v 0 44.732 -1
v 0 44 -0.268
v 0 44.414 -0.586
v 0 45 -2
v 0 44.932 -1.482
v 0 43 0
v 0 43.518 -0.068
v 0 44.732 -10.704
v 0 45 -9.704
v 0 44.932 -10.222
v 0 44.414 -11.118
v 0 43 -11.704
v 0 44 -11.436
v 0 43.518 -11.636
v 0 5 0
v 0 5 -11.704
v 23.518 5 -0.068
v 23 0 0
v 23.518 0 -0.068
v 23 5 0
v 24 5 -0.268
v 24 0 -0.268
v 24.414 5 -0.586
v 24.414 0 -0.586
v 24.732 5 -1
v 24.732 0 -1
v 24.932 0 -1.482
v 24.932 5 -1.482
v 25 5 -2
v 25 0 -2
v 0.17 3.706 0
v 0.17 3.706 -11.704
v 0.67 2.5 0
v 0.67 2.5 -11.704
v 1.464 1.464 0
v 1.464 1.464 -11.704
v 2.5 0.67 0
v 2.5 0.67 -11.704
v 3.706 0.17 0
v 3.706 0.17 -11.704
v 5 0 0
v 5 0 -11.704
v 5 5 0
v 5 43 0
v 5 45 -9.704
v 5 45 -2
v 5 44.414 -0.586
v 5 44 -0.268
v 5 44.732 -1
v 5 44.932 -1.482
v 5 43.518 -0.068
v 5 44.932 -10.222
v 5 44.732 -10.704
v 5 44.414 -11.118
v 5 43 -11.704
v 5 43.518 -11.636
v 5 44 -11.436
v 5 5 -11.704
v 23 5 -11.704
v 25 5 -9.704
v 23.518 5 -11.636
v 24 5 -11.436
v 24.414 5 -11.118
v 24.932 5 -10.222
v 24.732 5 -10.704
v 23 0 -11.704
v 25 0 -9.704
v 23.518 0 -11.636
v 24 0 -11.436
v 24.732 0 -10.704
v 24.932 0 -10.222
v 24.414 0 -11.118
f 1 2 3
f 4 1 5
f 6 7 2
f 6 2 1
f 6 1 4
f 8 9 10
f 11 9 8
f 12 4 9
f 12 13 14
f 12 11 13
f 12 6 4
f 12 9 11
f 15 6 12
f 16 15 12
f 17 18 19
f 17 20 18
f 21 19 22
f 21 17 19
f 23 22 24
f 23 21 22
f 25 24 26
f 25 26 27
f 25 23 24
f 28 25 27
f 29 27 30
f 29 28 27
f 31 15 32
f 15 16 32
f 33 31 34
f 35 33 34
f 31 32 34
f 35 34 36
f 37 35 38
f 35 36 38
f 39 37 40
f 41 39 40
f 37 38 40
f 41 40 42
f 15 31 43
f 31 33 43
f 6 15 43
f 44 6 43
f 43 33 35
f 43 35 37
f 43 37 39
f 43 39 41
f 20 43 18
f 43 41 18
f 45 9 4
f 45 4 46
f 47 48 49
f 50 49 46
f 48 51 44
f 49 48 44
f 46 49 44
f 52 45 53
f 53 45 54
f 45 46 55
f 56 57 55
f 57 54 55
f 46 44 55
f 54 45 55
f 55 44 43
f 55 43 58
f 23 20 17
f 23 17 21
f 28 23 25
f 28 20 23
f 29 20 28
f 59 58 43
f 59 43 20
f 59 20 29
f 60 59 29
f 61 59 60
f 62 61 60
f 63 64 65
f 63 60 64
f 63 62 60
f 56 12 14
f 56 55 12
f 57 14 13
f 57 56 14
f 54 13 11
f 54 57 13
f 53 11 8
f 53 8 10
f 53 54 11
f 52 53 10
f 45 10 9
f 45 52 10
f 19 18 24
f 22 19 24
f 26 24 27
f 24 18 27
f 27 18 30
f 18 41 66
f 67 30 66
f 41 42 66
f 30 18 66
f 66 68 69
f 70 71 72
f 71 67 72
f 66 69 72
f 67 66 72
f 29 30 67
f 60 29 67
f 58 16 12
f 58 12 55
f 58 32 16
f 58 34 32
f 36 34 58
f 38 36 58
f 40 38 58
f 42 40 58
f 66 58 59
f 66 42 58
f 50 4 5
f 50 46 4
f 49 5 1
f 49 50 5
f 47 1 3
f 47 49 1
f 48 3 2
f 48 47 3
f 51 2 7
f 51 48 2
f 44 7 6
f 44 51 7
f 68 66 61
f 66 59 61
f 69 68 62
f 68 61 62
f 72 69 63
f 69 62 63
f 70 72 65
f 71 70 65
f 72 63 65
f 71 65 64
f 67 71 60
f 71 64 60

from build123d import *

# Parameters (mm, degrees)
SKETCH1_W           = 25
SKETCH1_H           = 11.704143749
BOSS_EXTRUDE1_DEPTH = 5
SKETCH2_W           = 5
SKETCH2_H           = 11.704143749
BOSS_EXTRUDE2_DEPTH = 40
FILLET1_R           = 5
FILLET2_R           = 2


with BuildPart() as part:
    # Sketch1 → Boss-Extrude1 (new body)
    with BuildSketch(Plane(origin=(0, 0, 0), x_dir=(1, 0, 0), z_dir=(0, 1, 0))):
        with Locations((12.5, 5.852071874)):
            Rectangle(SKETCH1_W, SKETCH1_H)
    extrude(amount=BOSS_EXTRUDE1_DEPTH)

    # Sketch2 → Boss-Extrude2 (add)
    with BuildSketch(Plane(origin=(0, 5, 0), x_dir=(1, 0, 0), z_dir=(0, 1, 0))):
        with Locations((2.5, 5.852071874)):
            Rectangle(SKETCH2_W, SKETCH2_H)
    extrude(amount=BOSS_EXTRUDE2_DEPTH)

    # Fillet1
    fillet1_edges = [part.edges().sort_by_distance(p)[0] for p in [
        (0, 0, -5.852071875),
    ]]
    fillet(fillet1_edges, radius=FILLET1_R)

    # Fillet2
    fillet2_edges = [part.edges().sort_by_distance(p)[0] for p in [
        (2.5, 45, 0),
        (2.5, 45, -11.704143749),
        (25, 2.5, -11.704143749),
        (25, 2.5, 0),
    ]]
    fillet(fillet2_edges, radius=FILLET2_R)


solid = part.part
